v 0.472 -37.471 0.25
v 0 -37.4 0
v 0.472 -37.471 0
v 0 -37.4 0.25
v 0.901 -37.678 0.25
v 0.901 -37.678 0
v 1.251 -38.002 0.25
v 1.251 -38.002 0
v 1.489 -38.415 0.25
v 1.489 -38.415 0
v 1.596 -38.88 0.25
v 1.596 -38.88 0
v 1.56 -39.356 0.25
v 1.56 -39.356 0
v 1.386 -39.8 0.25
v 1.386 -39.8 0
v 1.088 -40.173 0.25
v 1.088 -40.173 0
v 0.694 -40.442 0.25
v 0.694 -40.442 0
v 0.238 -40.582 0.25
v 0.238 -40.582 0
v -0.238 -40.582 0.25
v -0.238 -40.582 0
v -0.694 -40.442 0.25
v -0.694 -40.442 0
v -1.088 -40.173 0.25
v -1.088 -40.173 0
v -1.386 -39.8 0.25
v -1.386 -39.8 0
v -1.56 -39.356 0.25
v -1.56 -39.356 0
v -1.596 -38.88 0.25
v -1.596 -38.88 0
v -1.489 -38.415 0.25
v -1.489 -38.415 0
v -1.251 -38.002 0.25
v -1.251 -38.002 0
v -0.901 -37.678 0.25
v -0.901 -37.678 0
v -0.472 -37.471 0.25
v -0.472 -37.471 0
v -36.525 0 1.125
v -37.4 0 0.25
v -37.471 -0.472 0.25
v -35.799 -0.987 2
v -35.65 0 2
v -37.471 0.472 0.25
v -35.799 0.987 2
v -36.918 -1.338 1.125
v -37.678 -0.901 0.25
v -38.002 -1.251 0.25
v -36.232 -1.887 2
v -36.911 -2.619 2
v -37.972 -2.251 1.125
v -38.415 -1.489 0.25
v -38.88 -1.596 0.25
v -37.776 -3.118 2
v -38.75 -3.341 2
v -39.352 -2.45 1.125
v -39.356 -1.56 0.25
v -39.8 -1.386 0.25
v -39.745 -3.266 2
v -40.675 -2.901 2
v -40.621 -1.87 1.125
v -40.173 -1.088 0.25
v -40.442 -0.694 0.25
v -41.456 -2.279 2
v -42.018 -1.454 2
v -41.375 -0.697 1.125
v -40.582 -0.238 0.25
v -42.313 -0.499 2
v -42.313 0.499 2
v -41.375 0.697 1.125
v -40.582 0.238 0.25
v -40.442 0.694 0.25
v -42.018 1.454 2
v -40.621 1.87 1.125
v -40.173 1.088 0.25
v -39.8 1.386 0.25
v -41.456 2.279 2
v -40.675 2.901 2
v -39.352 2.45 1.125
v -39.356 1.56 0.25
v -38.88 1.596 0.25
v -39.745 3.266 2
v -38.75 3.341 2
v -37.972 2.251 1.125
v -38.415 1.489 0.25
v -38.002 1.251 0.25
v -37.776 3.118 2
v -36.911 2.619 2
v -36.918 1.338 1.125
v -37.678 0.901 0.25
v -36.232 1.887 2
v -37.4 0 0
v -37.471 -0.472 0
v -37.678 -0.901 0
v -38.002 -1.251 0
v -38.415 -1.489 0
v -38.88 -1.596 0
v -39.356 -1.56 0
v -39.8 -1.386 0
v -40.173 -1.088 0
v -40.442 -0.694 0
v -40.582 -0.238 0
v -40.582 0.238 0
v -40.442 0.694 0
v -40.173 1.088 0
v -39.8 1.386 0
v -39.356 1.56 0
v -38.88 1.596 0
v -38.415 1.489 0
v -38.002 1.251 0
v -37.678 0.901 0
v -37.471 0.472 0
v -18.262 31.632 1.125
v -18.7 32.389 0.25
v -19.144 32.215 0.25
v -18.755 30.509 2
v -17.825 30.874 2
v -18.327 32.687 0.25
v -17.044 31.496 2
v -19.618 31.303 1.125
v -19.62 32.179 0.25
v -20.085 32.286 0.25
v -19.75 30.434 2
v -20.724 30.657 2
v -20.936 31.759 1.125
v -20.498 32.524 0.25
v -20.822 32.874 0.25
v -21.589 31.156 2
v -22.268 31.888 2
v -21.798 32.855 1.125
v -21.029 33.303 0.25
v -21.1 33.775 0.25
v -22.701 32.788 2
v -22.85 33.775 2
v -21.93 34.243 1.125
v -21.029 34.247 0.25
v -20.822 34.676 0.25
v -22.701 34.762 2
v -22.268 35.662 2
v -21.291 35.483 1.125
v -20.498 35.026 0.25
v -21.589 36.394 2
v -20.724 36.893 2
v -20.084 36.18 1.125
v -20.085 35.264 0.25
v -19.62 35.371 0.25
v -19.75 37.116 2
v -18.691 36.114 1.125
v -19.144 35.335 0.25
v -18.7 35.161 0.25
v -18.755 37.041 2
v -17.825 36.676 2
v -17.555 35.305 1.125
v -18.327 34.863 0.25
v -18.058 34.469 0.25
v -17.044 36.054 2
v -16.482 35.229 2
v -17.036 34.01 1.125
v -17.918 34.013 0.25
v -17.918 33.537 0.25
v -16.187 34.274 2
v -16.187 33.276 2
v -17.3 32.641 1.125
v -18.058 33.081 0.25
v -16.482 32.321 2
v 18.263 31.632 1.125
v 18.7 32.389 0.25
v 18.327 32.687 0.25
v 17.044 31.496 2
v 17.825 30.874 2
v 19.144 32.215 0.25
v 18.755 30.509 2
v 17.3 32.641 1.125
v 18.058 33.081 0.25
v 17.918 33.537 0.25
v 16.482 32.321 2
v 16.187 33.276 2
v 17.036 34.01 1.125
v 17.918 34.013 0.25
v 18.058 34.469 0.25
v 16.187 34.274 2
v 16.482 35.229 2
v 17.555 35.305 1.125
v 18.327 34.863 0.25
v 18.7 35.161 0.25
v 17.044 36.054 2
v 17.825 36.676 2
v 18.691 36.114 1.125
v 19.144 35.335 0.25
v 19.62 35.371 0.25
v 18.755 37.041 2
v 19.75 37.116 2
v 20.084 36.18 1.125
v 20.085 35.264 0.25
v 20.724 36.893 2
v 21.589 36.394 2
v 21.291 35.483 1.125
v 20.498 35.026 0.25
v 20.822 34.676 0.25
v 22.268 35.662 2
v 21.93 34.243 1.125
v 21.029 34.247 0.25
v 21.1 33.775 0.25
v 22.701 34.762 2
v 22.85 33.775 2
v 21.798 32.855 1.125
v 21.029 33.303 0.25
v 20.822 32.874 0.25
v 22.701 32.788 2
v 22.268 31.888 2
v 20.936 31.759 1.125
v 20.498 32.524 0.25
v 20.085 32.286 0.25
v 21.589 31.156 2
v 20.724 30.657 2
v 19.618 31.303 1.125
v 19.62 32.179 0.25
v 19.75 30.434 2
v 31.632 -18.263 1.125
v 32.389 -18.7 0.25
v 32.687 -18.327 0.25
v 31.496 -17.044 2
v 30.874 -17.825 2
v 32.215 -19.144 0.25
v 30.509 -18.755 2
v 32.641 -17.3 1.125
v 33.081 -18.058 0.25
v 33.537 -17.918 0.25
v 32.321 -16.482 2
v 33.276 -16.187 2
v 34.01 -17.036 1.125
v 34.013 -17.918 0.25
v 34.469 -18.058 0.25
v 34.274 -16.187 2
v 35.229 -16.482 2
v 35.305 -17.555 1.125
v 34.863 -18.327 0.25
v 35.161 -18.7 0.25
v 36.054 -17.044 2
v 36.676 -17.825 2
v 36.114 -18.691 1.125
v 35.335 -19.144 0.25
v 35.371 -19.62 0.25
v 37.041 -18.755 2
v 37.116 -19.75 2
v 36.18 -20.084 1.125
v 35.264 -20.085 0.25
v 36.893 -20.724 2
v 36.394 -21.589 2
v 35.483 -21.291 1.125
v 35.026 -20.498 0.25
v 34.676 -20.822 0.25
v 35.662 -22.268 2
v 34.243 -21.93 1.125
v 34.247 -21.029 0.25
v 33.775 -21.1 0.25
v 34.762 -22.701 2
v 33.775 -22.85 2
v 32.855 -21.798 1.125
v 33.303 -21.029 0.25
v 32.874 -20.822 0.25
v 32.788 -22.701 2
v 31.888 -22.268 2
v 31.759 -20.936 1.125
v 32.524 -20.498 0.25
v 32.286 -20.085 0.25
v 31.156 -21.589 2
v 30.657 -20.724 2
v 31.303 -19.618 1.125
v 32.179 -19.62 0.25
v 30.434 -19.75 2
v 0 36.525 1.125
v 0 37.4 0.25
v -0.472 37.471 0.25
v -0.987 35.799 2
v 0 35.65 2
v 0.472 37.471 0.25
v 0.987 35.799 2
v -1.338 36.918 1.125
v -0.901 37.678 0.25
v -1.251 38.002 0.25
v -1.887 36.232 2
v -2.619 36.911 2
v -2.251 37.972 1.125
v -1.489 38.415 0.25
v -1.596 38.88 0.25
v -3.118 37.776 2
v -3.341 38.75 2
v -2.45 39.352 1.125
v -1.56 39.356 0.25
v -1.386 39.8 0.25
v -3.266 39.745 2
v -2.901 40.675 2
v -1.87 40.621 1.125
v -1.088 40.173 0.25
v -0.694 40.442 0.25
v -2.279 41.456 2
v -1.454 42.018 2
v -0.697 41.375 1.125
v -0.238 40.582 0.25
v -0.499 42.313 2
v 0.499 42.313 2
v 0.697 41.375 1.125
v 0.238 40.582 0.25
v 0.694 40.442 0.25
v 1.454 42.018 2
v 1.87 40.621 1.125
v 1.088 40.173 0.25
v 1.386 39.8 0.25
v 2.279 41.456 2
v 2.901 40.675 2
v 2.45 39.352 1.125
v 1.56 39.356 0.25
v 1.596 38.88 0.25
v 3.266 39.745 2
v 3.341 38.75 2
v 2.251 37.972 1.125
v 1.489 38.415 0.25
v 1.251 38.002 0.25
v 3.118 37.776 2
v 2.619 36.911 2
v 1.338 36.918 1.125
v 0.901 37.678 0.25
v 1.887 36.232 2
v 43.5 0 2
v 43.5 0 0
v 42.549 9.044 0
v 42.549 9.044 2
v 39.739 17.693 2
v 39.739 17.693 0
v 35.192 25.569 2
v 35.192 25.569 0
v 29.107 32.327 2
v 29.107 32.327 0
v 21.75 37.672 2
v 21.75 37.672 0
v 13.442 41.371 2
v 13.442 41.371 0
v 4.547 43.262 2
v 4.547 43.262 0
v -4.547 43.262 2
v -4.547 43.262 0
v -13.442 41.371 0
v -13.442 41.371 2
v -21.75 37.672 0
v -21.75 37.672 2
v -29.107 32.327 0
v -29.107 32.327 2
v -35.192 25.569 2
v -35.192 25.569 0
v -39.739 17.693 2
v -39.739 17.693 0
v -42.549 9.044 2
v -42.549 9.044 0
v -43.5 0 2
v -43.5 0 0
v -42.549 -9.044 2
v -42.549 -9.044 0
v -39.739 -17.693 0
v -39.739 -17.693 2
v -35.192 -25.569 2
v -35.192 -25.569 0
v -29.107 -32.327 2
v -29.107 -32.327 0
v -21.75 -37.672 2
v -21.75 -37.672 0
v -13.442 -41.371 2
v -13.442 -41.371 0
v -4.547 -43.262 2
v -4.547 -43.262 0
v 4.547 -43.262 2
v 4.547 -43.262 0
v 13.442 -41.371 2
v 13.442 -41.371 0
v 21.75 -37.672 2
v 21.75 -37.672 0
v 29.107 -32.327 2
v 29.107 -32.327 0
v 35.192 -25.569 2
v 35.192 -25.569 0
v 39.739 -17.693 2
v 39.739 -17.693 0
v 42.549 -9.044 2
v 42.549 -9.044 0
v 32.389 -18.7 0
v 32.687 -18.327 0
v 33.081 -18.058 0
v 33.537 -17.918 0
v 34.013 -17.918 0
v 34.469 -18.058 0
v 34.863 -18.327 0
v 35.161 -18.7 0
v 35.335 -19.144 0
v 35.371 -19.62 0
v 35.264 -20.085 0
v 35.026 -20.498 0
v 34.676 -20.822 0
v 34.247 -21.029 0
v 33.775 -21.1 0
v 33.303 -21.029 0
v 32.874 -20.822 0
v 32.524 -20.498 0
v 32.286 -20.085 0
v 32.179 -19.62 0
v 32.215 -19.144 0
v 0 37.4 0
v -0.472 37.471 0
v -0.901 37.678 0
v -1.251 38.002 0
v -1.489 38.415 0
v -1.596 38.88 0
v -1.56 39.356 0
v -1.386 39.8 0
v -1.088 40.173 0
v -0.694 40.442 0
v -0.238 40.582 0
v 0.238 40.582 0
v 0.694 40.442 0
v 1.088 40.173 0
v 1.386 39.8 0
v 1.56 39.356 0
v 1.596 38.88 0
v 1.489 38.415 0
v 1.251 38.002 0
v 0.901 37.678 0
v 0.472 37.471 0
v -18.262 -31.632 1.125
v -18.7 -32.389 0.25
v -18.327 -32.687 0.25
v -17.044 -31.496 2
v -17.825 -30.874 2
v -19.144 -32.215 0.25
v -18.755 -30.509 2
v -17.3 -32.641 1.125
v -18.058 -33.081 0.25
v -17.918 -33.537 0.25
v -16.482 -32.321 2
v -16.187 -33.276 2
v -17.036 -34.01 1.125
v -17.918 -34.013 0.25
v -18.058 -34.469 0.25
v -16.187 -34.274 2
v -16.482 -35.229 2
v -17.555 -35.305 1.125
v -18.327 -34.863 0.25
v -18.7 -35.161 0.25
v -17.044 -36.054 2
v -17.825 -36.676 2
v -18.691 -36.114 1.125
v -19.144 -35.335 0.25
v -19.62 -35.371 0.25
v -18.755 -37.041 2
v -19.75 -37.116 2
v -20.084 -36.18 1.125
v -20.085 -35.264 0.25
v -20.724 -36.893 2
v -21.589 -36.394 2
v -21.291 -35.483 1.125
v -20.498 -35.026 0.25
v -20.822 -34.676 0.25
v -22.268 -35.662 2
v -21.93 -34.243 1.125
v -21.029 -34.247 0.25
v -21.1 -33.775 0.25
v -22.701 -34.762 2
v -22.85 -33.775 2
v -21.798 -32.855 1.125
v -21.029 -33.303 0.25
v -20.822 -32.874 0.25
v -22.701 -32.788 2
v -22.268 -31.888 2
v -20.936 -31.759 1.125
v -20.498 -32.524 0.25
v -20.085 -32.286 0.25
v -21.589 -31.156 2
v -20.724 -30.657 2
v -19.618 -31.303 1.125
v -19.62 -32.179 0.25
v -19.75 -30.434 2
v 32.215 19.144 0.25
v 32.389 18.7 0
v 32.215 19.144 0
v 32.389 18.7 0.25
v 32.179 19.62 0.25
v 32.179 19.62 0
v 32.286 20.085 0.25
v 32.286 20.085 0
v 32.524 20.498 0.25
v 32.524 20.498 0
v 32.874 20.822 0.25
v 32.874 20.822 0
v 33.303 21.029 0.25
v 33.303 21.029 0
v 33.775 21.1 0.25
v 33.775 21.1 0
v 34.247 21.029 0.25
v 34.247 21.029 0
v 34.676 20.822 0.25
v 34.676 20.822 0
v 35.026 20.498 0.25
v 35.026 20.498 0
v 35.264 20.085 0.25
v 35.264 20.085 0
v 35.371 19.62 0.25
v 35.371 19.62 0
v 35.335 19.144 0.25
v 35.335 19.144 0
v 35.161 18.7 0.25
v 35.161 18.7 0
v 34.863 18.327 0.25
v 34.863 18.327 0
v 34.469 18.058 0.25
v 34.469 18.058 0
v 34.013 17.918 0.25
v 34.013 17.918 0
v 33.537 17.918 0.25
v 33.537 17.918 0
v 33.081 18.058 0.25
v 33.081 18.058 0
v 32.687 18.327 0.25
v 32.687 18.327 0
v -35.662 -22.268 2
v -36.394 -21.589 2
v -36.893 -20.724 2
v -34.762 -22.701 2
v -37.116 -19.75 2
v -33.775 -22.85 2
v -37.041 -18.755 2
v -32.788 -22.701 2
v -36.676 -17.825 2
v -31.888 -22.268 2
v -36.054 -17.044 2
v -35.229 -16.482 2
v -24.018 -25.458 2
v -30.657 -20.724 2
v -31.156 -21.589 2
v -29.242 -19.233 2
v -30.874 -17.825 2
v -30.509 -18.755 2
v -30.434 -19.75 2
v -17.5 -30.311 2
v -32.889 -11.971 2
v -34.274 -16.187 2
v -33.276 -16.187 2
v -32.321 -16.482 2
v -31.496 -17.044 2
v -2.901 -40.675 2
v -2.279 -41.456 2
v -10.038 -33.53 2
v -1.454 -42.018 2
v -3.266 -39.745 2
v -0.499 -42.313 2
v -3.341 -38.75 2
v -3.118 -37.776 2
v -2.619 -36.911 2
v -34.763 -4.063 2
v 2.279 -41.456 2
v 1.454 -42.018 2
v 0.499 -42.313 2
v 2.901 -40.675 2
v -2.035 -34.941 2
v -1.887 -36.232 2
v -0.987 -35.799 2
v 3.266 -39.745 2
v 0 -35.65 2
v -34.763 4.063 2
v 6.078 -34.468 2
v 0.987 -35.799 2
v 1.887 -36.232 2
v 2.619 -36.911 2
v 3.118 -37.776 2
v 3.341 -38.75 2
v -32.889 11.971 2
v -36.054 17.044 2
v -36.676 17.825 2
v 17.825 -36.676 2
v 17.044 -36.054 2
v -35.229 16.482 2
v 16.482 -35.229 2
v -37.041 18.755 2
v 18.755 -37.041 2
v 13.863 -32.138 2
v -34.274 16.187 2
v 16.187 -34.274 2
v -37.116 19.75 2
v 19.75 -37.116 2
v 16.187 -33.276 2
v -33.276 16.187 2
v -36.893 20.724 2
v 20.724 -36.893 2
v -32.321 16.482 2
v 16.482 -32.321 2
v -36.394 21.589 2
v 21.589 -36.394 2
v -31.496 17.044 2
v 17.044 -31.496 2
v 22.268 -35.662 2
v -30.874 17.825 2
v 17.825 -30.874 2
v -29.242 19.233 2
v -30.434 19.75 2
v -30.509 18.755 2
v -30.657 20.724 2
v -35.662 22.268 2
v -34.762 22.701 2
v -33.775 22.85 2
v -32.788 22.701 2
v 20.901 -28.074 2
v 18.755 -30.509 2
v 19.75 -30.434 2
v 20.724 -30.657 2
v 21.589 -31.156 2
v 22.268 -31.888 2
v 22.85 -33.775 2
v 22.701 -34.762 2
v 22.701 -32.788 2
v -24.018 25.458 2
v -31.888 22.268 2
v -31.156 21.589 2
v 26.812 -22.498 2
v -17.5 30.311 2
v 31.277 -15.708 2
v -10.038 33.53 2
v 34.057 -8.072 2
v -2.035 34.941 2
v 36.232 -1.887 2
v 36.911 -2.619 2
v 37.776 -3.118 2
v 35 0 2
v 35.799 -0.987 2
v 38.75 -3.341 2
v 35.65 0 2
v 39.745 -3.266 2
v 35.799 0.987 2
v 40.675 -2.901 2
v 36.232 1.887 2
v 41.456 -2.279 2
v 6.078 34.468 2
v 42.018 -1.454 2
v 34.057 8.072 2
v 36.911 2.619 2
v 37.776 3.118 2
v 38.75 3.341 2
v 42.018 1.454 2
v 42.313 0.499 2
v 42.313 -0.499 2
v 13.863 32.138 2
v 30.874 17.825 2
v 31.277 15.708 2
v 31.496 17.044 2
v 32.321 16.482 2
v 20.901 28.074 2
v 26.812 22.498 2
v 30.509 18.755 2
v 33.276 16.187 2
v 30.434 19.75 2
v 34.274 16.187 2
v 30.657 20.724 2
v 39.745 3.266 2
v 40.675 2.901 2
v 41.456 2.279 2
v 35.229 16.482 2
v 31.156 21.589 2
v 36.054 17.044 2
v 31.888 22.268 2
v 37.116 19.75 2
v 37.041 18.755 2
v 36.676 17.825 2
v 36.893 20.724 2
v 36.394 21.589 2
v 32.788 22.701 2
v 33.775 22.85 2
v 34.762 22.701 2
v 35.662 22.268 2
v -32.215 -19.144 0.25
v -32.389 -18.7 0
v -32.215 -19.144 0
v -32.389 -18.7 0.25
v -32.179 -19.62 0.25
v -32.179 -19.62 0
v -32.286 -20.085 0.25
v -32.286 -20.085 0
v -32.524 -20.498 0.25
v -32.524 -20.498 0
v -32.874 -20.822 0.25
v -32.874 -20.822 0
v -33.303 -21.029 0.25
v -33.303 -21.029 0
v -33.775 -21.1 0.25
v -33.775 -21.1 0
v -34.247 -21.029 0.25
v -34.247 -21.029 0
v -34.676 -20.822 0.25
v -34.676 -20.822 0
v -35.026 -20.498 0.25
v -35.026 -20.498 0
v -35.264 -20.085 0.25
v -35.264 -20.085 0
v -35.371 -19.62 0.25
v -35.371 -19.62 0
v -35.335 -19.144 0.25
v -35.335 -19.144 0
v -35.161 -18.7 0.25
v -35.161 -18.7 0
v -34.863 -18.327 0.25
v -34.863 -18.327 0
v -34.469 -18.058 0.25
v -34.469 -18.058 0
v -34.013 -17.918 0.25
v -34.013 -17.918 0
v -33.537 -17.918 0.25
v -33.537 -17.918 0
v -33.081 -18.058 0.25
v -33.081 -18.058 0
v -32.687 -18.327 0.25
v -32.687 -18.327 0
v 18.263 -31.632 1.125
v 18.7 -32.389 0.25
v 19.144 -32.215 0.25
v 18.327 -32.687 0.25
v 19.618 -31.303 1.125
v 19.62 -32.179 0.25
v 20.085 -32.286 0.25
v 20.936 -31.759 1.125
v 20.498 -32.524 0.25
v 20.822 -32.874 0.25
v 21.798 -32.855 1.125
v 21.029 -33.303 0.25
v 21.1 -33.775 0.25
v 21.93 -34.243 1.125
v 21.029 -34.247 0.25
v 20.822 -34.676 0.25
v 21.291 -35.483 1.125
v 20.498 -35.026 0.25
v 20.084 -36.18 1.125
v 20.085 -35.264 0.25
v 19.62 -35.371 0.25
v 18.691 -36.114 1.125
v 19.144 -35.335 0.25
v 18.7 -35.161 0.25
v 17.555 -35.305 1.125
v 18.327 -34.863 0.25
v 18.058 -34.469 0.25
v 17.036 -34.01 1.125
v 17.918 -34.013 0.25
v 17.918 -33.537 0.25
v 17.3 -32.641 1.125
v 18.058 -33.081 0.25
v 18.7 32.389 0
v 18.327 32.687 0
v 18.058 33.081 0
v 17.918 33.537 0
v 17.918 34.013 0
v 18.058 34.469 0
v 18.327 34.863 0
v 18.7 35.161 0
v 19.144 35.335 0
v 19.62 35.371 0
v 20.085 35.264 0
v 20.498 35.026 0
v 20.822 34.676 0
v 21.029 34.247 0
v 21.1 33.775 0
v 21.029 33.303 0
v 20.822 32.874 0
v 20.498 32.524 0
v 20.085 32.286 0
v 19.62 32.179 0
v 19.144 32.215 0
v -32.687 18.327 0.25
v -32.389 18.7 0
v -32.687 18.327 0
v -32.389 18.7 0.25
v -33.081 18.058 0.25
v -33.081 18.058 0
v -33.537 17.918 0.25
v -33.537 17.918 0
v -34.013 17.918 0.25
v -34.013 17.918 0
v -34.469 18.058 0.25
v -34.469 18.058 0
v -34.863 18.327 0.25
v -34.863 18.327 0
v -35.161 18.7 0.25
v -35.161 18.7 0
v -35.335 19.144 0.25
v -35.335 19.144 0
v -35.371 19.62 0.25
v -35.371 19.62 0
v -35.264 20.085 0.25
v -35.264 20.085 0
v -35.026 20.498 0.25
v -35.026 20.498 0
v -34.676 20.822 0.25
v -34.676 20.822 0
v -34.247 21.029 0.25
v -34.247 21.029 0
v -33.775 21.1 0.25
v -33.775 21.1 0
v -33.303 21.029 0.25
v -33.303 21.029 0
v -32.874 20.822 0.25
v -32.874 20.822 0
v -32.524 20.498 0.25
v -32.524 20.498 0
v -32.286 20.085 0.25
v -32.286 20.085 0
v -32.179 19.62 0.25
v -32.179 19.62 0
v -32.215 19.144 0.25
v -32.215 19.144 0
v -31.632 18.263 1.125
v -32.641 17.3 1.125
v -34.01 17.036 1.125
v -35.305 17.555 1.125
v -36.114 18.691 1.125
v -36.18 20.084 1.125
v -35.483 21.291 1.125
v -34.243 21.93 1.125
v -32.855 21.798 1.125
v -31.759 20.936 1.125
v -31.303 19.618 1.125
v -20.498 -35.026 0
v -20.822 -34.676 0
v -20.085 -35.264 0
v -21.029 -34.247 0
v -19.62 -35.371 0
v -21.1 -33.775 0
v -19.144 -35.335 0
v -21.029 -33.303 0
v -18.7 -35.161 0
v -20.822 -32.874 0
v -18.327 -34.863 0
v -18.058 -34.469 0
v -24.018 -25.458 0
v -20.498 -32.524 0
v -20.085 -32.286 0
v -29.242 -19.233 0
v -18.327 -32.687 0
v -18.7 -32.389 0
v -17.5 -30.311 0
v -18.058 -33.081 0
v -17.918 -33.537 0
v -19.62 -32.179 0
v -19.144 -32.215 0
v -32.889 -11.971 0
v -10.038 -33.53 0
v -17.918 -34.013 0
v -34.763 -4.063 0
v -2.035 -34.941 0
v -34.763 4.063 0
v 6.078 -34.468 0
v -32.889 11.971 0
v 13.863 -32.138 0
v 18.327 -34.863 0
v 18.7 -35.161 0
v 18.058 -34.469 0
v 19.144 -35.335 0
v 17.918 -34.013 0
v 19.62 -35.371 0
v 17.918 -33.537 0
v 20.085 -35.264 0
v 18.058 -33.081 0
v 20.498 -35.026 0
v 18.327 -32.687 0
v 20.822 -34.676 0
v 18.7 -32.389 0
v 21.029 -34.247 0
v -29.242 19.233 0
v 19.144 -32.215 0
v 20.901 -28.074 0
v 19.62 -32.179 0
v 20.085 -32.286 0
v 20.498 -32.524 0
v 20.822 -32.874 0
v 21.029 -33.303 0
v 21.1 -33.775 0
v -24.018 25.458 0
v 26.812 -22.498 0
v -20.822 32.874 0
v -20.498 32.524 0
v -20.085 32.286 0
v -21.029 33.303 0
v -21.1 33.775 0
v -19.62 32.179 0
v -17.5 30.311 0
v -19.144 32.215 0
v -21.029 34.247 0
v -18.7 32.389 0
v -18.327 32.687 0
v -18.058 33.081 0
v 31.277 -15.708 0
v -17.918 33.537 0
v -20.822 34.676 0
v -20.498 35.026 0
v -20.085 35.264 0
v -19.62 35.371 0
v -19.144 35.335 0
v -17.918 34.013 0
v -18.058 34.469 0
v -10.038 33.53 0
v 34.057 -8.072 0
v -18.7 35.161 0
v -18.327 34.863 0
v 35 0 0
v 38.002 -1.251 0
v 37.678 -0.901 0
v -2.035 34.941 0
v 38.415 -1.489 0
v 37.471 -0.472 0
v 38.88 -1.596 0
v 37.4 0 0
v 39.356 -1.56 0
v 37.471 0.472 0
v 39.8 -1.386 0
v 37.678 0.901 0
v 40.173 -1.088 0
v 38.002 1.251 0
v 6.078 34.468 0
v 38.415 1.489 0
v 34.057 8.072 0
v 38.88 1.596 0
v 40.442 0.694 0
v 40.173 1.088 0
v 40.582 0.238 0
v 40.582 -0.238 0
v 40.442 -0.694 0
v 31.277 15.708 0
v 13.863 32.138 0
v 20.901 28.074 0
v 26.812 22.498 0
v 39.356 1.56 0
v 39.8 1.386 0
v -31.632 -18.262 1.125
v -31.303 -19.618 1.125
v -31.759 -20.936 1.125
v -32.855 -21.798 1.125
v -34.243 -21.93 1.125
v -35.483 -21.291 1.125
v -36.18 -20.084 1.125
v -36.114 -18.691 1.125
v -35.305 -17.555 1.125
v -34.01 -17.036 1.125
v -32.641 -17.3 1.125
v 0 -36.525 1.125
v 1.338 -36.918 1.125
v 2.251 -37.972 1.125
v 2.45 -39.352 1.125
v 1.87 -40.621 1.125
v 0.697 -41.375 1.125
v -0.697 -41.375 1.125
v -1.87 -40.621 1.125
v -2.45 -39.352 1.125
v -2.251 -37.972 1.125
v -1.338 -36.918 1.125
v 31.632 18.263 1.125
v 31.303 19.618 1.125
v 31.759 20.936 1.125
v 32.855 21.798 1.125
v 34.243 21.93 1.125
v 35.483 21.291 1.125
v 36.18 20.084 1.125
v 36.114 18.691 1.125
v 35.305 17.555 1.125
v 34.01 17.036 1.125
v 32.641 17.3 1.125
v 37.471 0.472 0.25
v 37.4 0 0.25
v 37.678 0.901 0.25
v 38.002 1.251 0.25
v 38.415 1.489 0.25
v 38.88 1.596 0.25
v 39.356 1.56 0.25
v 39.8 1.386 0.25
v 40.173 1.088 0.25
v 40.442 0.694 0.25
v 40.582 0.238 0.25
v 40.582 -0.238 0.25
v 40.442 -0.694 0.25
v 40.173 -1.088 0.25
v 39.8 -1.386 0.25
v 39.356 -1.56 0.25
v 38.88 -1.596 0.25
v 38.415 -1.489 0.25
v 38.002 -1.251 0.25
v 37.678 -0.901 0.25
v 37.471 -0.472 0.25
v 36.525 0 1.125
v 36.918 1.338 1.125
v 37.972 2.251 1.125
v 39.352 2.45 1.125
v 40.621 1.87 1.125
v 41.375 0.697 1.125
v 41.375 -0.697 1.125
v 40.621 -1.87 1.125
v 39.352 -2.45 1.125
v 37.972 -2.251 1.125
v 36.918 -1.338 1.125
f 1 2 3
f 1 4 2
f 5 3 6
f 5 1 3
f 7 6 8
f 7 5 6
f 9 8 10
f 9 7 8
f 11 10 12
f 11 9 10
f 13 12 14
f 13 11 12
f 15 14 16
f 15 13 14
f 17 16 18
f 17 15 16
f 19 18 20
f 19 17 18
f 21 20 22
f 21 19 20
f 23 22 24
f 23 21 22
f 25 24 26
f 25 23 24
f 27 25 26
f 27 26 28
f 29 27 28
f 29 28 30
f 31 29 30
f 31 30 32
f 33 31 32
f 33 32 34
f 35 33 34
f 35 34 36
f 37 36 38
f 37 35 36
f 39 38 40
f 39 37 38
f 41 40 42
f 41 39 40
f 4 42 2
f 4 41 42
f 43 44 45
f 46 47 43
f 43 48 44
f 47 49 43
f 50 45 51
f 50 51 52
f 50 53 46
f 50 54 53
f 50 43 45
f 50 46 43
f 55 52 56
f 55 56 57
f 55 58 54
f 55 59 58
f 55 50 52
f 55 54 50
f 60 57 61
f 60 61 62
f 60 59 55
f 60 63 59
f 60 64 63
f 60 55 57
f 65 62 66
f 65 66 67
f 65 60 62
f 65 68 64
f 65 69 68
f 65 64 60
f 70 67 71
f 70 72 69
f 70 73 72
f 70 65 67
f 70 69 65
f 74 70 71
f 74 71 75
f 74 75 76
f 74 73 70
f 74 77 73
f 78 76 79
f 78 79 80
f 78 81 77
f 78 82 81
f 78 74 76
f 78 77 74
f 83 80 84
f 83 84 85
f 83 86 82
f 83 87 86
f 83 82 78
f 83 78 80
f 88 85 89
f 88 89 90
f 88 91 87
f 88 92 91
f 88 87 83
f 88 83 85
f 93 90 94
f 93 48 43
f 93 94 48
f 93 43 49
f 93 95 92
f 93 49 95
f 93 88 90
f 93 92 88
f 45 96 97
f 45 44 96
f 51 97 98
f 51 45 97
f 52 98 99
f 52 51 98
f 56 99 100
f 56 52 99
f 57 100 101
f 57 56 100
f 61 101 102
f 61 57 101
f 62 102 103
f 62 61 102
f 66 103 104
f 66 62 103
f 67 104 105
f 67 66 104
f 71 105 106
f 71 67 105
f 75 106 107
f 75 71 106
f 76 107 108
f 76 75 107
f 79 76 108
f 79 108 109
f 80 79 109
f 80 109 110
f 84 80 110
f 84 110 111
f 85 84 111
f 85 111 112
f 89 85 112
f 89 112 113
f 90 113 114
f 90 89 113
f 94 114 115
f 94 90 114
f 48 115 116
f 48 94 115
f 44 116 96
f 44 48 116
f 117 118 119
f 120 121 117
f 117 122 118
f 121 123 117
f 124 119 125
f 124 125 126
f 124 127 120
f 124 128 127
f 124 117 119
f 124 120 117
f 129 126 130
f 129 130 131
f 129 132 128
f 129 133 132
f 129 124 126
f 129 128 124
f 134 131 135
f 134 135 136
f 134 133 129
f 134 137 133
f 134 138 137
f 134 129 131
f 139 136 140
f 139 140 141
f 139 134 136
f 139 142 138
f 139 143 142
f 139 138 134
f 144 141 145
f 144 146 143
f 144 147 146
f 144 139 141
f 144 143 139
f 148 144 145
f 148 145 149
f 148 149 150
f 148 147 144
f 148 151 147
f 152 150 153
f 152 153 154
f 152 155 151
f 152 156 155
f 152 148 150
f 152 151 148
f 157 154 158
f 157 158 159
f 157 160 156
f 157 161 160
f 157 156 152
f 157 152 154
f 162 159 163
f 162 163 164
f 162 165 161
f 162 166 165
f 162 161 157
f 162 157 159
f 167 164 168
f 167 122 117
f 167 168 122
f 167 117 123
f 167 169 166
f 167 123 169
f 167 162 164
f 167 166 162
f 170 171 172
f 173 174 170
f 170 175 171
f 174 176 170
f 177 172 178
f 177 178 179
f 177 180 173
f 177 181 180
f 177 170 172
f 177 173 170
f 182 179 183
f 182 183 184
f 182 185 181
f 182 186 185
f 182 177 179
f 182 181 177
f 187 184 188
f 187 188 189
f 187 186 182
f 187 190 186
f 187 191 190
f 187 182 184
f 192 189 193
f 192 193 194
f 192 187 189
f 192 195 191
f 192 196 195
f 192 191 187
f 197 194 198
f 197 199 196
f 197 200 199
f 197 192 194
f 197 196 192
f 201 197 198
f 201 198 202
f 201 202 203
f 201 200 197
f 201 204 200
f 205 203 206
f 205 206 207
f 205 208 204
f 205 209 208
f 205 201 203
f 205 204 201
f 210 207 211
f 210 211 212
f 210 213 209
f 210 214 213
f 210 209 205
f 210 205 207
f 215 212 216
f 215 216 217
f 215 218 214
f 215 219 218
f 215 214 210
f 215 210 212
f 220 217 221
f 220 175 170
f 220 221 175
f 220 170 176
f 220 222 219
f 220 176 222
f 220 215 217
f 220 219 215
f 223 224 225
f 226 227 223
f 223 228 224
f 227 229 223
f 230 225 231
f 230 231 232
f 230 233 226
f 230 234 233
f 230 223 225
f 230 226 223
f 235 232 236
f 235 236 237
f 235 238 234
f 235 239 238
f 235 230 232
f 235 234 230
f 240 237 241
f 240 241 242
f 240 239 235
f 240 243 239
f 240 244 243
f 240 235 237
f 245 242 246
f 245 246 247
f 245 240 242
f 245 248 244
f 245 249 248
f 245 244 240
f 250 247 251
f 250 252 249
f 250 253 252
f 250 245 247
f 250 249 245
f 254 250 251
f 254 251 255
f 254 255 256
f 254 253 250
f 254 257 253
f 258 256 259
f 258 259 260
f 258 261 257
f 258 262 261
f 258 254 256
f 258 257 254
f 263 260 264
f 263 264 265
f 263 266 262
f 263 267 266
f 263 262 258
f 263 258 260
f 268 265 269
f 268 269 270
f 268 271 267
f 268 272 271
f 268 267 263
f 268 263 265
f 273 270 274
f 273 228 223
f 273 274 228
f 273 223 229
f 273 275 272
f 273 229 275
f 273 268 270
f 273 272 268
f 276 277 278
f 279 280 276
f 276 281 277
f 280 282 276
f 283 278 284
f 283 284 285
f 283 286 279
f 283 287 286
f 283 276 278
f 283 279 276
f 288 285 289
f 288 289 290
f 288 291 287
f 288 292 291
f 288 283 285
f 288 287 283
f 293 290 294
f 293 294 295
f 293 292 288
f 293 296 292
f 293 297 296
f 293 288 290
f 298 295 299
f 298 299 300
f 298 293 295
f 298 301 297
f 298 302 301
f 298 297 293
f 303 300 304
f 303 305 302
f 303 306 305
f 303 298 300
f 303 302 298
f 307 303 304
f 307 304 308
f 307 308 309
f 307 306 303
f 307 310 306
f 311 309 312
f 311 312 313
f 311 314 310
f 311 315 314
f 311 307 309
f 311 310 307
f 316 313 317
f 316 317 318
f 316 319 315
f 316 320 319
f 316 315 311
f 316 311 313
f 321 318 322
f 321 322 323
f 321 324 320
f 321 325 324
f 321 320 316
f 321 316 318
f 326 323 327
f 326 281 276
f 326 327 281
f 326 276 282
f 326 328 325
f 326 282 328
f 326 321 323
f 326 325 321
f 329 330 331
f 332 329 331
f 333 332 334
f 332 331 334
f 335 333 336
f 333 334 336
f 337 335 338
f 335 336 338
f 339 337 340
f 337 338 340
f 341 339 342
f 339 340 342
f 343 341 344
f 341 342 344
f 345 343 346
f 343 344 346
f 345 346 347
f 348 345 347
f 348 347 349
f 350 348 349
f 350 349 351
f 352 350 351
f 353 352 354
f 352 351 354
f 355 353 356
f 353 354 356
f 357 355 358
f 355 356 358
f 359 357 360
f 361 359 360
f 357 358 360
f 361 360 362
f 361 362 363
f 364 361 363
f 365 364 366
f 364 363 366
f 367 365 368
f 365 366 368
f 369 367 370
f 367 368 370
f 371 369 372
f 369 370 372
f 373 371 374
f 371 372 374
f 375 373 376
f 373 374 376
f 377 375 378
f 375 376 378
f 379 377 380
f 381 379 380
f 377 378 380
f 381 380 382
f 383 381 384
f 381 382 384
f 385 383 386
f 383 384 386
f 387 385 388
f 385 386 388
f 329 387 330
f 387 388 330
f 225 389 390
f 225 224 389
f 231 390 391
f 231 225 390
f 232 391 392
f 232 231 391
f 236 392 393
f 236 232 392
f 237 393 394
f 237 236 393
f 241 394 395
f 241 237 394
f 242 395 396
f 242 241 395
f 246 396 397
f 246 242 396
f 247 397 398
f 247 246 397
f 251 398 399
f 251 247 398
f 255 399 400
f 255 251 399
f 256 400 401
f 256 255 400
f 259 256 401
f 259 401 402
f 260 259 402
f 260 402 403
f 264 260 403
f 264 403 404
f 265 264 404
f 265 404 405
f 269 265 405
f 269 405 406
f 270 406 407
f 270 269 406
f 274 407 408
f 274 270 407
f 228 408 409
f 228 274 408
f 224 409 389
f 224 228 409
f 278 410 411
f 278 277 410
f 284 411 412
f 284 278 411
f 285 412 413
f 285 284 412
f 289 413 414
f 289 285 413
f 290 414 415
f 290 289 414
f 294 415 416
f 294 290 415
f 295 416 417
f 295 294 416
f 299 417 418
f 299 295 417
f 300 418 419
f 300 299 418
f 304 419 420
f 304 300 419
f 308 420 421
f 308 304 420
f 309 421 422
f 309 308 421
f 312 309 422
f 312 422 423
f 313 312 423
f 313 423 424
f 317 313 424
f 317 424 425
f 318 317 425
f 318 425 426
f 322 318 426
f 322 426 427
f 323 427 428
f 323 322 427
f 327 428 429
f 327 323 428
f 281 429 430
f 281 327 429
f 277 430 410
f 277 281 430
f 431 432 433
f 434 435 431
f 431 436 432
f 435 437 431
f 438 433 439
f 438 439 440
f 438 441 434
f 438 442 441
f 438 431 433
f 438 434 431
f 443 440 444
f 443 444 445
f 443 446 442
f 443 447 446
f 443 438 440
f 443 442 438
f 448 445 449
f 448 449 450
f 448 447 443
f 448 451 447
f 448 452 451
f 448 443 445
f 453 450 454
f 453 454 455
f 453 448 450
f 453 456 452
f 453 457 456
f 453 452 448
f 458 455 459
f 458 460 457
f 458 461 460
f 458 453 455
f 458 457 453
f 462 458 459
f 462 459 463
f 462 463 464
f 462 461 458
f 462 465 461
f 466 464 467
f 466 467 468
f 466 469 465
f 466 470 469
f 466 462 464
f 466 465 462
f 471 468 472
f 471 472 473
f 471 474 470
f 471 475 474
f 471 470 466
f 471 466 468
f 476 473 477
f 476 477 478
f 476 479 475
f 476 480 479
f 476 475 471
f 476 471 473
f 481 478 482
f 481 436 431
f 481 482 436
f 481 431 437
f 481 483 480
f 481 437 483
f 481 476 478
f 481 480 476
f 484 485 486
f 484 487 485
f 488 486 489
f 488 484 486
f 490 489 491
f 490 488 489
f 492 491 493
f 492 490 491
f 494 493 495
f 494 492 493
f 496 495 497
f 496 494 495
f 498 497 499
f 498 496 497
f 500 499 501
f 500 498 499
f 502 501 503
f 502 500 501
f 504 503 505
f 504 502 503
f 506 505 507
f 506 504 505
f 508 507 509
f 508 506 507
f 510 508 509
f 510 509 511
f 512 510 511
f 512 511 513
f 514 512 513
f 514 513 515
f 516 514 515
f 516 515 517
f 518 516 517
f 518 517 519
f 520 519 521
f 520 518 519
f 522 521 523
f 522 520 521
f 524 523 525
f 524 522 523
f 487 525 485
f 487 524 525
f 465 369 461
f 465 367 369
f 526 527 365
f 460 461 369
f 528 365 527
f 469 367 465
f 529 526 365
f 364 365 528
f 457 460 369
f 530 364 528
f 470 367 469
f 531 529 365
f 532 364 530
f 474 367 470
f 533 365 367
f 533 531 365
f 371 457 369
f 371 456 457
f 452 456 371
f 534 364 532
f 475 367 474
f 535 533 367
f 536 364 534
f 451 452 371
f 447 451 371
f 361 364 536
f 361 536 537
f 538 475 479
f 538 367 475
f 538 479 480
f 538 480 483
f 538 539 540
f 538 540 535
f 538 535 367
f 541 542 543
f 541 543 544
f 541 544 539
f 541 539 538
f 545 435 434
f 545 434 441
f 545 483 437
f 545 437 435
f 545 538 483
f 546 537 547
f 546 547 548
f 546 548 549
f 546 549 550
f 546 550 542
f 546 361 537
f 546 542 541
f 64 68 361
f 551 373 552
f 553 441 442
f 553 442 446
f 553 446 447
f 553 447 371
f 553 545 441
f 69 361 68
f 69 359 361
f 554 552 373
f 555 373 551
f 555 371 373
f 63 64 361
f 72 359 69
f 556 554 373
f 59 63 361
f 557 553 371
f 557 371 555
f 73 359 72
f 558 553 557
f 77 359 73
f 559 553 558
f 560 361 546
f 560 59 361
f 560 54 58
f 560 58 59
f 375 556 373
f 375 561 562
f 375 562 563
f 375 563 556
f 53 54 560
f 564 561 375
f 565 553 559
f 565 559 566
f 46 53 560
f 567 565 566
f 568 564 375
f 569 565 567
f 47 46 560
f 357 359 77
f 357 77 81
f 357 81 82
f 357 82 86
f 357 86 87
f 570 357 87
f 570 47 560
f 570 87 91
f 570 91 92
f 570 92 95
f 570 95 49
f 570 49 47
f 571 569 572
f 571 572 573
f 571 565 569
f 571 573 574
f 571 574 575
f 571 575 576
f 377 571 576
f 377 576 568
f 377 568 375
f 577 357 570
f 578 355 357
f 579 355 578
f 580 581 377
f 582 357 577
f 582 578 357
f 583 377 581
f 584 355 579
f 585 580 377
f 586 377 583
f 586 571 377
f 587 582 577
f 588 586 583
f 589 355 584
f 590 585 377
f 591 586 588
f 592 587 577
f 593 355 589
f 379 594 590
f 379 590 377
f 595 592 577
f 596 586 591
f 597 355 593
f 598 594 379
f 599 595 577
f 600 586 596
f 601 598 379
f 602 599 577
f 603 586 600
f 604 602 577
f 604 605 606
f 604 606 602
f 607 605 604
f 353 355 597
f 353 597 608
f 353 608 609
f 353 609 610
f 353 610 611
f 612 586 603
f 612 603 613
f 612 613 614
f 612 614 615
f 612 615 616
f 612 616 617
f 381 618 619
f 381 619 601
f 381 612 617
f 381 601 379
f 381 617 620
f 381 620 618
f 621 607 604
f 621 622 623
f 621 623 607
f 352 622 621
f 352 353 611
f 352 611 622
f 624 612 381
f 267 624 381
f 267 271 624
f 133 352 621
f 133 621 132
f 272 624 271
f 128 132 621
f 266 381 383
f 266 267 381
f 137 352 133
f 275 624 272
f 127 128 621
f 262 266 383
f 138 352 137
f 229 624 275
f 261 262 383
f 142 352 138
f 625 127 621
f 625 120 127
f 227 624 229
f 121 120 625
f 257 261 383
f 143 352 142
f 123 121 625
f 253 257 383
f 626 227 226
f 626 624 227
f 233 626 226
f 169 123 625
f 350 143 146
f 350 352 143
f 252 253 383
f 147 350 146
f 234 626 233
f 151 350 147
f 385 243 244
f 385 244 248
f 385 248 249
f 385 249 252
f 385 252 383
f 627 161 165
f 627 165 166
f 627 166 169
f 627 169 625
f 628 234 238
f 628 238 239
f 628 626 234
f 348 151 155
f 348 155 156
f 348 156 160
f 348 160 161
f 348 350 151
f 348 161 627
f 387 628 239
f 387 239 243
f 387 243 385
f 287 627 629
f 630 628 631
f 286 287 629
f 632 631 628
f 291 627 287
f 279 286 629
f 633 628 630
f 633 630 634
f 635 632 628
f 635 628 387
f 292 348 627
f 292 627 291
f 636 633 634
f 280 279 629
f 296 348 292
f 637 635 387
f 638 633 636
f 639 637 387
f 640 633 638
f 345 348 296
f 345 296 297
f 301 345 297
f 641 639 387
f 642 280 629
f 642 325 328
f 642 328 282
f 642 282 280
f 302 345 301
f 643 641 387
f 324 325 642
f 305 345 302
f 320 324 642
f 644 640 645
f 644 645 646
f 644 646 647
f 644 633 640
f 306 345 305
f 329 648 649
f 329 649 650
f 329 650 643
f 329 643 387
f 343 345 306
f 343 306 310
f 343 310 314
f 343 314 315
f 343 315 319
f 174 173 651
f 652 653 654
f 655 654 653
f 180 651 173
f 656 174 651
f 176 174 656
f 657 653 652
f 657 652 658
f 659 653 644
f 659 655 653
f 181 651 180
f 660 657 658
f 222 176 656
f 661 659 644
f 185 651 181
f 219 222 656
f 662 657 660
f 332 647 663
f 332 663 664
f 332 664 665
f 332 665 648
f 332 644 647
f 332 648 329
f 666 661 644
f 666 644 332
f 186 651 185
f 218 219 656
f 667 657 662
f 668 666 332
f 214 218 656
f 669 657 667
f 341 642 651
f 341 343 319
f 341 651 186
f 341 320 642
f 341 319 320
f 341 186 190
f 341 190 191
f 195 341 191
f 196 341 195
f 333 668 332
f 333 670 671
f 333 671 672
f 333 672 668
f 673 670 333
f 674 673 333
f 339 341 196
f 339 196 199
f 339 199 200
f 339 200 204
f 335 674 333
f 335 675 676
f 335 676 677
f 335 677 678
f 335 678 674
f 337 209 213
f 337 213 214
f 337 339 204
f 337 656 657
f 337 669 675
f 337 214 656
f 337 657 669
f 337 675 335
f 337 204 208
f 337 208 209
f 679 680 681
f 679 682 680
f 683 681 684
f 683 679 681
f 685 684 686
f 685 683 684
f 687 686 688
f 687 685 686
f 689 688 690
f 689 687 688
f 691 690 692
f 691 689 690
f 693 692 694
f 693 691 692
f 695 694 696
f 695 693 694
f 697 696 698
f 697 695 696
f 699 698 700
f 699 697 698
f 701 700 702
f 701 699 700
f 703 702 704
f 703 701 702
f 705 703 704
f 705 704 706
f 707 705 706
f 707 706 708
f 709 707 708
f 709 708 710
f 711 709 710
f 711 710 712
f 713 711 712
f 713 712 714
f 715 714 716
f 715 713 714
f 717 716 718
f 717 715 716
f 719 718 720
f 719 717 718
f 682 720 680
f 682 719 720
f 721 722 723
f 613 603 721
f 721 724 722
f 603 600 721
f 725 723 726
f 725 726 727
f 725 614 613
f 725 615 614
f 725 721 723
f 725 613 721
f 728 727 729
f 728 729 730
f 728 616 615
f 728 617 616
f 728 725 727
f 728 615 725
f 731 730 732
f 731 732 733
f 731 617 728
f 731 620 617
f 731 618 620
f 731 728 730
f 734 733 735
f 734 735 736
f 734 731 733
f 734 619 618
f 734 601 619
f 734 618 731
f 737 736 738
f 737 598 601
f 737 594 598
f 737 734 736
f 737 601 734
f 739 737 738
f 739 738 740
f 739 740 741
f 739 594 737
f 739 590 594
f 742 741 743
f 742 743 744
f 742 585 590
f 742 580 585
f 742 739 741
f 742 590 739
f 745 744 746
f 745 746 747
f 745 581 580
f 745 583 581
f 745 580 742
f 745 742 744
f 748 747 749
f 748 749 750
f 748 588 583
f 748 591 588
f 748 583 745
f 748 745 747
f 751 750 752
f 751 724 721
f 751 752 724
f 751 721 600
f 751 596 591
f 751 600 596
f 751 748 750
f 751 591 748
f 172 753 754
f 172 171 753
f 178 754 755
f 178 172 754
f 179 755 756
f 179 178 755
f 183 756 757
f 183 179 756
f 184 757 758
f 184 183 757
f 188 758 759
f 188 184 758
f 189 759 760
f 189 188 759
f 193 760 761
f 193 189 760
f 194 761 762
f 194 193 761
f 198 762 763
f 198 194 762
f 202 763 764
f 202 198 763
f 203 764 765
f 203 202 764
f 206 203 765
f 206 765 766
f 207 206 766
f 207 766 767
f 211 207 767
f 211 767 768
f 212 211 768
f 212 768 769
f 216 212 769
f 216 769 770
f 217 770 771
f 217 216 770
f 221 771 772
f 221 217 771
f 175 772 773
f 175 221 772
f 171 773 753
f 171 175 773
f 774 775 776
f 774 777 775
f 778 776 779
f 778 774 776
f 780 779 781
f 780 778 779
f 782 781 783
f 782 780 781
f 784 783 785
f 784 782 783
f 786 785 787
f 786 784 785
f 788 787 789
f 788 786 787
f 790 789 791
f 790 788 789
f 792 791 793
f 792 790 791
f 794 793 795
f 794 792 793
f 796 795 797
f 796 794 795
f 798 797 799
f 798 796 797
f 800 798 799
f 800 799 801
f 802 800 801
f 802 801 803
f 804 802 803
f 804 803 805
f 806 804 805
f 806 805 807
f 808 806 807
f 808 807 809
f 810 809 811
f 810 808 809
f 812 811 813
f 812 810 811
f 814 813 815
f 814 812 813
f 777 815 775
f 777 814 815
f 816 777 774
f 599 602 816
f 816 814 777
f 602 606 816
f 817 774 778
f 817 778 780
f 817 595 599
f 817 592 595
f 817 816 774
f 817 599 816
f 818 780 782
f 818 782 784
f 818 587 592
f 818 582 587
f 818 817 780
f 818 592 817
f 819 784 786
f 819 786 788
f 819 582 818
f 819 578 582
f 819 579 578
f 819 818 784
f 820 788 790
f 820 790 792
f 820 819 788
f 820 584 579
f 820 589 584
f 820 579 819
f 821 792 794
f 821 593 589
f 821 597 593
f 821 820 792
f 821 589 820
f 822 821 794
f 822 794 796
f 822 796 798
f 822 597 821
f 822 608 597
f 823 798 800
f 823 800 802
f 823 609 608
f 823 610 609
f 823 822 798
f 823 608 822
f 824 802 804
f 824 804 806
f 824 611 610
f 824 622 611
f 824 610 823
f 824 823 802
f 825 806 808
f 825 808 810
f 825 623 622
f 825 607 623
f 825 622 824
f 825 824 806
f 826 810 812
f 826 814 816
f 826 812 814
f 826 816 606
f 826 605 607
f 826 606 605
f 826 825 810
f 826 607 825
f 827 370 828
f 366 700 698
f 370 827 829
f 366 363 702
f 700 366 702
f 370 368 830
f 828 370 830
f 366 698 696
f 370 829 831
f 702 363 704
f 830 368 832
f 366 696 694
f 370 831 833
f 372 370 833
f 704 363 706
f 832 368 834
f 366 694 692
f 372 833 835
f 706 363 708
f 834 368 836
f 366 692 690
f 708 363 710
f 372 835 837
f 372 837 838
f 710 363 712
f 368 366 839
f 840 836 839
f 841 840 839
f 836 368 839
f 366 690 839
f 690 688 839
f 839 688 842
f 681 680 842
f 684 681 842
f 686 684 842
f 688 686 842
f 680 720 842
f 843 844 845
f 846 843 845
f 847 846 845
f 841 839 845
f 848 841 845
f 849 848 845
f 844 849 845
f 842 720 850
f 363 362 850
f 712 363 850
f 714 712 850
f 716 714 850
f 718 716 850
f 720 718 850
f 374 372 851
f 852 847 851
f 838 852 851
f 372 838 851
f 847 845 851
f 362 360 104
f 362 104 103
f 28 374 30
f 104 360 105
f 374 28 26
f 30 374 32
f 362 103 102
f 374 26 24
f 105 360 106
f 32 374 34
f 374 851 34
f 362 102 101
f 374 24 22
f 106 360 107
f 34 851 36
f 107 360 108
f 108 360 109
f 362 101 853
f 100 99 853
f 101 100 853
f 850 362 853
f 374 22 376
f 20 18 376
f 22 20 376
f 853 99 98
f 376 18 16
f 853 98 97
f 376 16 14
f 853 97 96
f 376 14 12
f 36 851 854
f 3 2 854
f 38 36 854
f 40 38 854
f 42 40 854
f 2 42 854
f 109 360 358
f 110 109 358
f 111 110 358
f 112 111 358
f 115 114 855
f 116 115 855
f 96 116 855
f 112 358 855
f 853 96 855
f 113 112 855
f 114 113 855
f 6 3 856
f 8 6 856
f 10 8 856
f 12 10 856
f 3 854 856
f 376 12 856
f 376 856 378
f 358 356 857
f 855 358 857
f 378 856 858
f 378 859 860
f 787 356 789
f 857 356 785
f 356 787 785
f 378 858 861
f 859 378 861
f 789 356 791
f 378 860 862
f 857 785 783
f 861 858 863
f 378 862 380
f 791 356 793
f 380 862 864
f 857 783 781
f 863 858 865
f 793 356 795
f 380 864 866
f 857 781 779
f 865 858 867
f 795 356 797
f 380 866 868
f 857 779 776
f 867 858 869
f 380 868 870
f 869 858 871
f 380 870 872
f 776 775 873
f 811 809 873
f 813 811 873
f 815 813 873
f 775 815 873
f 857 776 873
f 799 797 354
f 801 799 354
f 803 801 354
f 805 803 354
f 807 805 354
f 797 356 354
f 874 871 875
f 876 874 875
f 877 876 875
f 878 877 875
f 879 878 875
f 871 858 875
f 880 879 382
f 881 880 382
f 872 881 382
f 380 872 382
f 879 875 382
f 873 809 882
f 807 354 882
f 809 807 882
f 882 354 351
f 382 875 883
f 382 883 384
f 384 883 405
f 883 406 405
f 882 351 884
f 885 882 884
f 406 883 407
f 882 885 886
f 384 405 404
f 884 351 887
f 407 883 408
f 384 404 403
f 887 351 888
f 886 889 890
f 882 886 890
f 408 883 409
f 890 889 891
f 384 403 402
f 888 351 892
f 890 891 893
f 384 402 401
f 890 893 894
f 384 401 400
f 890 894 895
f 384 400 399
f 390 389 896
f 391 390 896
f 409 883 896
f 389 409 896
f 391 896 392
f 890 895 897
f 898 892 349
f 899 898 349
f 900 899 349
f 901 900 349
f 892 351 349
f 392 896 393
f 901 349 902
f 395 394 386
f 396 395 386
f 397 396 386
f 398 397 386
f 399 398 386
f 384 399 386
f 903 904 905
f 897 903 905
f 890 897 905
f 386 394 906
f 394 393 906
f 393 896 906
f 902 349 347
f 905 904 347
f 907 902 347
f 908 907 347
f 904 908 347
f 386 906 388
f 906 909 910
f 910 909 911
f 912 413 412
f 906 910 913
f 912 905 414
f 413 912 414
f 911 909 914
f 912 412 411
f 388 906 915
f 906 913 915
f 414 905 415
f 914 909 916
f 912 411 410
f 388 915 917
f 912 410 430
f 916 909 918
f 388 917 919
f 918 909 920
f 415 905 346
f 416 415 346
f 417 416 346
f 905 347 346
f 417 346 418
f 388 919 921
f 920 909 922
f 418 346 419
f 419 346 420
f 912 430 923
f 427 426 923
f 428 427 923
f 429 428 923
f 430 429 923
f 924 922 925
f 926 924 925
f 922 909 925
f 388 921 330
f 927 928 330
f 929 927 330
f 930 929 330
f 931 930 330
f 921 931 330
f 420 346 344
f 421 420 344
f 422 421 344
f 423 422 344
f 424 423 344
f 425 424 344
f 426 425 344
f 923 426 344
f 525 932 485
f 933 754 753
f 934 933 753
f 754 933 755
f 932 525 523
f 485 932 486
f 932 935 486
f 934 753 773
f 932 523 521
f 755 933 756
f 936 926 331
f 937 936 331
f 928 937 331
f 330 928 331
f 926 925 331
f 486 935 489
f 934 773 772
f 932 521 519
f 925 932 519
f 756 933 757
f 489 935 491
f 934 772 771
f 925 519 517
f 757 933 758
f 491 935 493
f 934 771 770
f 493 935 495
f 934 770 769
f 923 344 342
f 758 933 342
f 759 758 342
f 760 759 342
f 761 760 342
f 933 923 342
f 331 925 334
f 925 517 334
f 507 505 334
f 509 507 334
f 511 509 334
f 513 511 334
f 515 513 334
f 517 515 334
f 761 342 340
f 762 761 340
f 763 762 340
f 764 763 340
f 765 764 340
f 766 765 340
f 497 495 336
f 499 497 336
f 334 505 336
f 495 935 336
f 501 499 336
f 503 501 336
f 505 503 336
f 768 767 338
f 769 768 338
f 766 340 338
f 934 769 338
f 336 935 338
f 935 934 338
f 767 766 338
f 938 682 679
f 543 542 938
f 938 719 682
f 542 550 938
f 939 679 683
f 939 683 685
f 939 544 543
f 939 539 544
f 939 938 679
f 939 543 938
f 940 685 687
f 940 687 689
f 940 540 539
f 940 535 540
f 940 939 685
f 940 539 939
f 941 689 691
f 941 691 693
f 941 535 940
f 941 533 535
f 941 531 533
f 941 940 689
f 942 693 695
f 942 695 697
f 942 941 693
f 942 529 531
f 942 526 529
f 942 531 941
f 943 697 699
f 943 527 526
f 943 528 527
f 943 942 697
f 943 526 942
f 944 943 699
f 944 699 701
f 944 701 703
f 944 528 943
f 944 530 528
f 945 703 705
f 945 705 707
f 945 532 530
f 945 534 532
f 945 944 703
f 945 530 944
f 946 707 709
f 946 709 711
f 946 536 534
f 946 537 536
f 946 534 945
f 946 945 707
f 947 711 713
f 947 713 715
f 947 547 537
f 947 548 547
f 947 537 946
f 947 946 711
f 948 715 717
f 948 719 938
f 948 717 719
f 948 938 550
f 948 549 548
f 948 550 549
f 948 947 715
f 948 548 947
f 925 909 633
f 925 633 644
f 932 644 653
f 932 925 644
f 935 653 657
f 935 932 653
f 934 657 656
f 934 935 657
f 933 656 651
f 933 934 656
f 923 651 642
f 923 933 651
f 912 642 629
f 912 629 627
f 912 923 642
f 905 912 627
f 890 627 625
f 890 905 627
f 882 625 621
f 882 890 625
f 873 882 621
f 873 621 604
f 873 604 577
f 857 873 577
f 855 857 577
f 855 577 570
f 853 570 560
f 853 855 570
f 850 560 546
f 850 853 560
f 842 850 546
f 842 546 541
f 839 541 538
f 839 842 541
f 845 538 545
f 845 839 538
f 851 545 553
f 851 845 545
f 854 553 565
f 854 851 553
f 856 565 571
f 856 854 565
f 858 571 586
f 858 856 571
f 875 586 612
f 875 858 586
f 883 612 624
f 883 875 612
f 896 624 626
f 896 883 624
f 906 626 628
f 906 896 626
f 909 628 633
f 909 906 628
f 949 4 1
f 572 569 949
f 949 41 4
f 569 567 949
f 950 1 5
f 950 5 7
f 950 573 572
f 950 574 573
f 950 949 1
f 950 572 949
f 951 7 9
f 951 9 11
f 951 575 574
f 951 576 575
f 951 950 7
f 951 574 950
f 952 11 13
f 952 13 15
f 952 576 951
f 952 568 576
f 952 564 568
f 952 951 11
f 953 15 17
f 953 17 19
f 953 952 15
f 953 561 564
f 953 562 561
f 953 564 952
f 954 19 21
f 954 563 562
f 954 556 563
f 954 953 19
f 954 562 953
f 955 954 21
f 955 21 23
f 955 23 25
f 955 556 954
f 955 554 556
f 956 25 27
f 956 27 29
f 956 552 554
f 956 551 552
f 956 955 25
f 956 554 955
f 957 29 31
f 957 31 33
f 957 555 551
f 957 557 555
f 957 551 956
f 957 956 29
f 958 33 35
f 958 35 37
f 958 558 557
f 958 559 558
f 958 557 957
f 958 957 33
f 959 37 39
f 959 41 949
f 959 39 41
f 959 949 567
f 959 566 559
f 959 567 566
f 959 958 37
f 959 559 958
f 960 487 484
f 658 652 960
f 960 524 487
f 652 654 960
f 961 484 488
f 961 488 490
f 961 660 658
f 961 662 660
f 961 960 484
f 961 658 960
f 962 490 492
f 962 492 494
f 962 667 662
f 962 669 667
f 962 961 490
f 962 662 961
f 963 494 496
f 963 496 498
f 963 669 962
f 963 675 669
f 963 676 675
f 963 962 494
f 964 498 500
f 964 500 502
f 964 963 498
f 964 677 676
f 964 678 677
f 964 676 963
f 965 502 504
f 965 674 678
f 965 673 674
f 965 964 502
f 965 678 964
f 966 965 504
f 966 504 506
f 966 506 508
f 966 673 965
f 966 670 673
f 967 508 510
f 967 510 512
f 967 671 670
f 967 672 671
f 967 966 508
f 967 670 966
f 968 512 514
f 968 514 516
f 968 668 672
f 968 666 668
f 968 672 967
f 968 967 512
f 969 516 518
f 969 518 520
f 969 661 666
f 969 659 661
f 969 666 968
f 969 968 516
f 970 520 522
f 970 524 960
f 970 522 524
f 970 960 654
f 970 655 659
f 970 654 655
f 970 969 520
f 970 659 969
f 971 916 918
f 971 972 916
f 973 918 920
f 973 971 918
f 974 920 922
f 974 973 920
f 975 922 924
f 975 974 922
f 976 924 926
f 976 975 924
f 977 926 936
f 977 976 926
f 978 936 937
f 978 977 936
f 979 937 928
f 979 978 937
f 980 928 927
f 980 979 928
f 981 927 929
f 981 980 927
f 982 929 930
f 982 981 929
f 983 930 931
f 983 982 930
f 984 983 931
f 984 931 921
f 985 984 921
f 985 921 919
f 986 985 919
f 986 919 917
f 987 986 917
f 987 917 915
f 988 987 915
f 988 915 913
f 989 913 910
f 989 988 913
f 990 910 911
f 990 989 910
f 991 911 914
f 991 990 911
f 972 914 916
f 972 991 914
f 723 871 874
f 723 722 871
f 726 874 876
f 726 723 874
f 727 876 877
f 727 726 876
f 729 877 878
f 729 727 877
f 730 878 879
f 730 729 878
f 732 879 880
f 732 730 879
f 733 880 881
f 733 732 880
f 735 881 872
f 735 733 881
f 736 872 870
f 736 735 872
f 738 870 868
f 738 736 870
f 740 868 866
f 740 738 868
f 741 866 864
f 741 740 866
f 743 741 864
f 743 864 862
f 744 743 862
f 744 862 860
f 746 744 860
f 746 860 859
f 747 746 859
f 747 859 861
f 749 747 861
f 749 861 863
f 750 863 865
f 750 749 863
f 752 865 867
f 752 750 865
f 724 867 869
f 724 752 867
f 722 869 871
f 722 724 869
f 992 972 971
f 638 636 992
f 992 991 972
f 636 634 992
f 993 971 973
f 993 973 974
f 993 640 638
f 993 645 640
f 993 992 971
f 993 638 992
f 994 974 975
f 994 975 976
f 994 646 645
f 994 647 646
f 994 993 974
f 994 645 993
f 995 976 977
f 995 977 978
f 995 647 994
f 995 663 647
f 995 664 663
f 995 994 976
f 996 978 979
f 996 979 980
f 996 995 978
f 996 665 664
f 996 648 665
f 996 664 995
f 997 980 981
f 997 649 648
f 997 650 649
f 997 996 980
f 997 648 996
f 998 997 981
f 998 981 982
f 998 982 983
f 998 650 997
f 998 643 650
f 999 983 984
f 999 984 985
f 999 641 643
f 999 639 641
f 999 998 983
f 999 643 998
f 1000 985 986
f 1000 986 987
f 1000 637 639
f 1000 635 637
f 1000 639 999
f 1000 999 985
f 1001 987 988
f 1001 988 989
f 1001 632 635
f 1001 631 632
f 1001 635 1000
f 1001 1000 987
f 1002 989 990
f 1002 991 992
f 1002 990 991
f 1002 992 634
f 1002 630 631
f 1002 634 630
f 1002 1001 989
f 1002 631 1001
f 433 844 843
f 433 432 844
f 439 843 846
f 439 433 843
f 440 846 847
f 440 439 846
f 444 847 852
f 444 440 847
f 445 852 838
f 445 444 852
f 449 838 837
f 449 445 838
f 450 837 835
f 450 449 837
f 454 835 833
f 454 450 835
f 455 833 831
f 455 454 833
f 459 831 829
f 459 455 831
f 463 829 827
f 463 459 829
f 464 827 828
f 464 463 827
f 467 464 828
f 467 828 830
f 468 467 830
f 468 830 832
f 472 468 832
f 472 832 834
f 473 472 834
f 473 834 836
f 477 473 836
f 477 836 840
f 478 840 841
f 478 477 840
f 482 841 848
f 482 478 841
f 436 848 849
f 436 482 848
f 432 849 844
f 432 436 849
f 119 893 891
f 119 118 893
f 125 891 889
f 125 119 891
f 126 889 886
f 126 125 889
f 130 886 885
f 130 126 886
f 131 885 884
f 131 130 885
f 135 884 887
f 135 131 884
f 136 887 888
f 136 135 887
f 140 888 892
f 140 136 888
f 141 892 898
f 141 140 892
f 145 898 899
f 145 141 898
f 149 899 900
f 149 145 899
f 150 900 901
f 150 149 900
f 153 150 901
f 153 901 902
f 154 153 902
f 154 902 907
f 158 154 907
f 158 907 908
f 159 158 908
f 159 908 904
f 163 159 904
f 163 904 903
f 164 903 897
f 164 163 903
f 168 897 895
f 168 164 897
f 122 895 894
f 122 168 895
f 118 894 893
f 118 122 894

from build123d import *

# Parameters (mm, degrees)
SKETCH1_R           = 43.5
SKETCH1_R_2         = 35
BOSS_EXTRUDE1_DEPTH = 2
SKETCH2_R           = 1.5
CUT_EXTRUDE1_DEPTH  = 10
CIRPATTERN1_COUNT   = 12
CIRPATTERN2_COUNT   = 12


with BuildPart() as part:
    # Sketch1 → Boss-Extrude1 (new body)
    with BuildSketch(Plane.XY):
        Circle(SKETCH1_R)
        Circle(SKETCH1_R_2, mode=Mode.SUBTRACT)
    extrude(amount=BOSS_EXTRUDE1_DEPTH)

    # Sketch2 → Cut-Extrude1 (cut)
    with BuildSketch(Plane.XY.offset(2)):
        with Locations((0, 39)):
            Circle(SKETCH2_R)
    cut_extrude1 = extrude(amount=-CUT_EXTRUDE1_DEPTH, mode=Mode.SUBTRACT)

    # CirPattern1: Cut-Extrude1 ×12 about axis
    cirpattern1_axis = Axis((0, 0, 0), (0, 0, 1))
    for i in range(1, CIRPATTERN1_COUNT):
        add(cut_extrude1.rotate(cirpattern1_axis, i * 360 / CIRPATTERN1_COUNT), mode=Mode.SUBTRACT)

    # Sketch4 → CSK for M3 Flat Head Machine Screw1 (revolve, cut)
    with BuildSketch(Plane(origin=(0, 39, 2), x_dir=(0, -1, 0), z_dir=(1, 0, 0))):
        Polygon((0, 0), (0, 2), (1.6, 2), (1.6, 1.75), (3.35, 0), align=None)
    csk_for_m3_flat_head_machine_screw1 = revolve(axis=Axis((0, 39, 8.35), (0, 0, -1)), mode=Mode.SUBTRACT)

    # CirPattern2: CSK for M3 Flat Head Machine Screw1 ×12 about axis
    cirpattern2_axis = Axis((0, 0, 0), (0, 0, 1))
    for i in range(1, CIRPATTERN2_COUNT):
        add(csk_for_m3_flat_head_machine_screw1.rotate(cirpattern2_axis, i * 360 / CIRPATTERN2_COUNT), mode=Mode.SUBTRACT)


solid = part.part
